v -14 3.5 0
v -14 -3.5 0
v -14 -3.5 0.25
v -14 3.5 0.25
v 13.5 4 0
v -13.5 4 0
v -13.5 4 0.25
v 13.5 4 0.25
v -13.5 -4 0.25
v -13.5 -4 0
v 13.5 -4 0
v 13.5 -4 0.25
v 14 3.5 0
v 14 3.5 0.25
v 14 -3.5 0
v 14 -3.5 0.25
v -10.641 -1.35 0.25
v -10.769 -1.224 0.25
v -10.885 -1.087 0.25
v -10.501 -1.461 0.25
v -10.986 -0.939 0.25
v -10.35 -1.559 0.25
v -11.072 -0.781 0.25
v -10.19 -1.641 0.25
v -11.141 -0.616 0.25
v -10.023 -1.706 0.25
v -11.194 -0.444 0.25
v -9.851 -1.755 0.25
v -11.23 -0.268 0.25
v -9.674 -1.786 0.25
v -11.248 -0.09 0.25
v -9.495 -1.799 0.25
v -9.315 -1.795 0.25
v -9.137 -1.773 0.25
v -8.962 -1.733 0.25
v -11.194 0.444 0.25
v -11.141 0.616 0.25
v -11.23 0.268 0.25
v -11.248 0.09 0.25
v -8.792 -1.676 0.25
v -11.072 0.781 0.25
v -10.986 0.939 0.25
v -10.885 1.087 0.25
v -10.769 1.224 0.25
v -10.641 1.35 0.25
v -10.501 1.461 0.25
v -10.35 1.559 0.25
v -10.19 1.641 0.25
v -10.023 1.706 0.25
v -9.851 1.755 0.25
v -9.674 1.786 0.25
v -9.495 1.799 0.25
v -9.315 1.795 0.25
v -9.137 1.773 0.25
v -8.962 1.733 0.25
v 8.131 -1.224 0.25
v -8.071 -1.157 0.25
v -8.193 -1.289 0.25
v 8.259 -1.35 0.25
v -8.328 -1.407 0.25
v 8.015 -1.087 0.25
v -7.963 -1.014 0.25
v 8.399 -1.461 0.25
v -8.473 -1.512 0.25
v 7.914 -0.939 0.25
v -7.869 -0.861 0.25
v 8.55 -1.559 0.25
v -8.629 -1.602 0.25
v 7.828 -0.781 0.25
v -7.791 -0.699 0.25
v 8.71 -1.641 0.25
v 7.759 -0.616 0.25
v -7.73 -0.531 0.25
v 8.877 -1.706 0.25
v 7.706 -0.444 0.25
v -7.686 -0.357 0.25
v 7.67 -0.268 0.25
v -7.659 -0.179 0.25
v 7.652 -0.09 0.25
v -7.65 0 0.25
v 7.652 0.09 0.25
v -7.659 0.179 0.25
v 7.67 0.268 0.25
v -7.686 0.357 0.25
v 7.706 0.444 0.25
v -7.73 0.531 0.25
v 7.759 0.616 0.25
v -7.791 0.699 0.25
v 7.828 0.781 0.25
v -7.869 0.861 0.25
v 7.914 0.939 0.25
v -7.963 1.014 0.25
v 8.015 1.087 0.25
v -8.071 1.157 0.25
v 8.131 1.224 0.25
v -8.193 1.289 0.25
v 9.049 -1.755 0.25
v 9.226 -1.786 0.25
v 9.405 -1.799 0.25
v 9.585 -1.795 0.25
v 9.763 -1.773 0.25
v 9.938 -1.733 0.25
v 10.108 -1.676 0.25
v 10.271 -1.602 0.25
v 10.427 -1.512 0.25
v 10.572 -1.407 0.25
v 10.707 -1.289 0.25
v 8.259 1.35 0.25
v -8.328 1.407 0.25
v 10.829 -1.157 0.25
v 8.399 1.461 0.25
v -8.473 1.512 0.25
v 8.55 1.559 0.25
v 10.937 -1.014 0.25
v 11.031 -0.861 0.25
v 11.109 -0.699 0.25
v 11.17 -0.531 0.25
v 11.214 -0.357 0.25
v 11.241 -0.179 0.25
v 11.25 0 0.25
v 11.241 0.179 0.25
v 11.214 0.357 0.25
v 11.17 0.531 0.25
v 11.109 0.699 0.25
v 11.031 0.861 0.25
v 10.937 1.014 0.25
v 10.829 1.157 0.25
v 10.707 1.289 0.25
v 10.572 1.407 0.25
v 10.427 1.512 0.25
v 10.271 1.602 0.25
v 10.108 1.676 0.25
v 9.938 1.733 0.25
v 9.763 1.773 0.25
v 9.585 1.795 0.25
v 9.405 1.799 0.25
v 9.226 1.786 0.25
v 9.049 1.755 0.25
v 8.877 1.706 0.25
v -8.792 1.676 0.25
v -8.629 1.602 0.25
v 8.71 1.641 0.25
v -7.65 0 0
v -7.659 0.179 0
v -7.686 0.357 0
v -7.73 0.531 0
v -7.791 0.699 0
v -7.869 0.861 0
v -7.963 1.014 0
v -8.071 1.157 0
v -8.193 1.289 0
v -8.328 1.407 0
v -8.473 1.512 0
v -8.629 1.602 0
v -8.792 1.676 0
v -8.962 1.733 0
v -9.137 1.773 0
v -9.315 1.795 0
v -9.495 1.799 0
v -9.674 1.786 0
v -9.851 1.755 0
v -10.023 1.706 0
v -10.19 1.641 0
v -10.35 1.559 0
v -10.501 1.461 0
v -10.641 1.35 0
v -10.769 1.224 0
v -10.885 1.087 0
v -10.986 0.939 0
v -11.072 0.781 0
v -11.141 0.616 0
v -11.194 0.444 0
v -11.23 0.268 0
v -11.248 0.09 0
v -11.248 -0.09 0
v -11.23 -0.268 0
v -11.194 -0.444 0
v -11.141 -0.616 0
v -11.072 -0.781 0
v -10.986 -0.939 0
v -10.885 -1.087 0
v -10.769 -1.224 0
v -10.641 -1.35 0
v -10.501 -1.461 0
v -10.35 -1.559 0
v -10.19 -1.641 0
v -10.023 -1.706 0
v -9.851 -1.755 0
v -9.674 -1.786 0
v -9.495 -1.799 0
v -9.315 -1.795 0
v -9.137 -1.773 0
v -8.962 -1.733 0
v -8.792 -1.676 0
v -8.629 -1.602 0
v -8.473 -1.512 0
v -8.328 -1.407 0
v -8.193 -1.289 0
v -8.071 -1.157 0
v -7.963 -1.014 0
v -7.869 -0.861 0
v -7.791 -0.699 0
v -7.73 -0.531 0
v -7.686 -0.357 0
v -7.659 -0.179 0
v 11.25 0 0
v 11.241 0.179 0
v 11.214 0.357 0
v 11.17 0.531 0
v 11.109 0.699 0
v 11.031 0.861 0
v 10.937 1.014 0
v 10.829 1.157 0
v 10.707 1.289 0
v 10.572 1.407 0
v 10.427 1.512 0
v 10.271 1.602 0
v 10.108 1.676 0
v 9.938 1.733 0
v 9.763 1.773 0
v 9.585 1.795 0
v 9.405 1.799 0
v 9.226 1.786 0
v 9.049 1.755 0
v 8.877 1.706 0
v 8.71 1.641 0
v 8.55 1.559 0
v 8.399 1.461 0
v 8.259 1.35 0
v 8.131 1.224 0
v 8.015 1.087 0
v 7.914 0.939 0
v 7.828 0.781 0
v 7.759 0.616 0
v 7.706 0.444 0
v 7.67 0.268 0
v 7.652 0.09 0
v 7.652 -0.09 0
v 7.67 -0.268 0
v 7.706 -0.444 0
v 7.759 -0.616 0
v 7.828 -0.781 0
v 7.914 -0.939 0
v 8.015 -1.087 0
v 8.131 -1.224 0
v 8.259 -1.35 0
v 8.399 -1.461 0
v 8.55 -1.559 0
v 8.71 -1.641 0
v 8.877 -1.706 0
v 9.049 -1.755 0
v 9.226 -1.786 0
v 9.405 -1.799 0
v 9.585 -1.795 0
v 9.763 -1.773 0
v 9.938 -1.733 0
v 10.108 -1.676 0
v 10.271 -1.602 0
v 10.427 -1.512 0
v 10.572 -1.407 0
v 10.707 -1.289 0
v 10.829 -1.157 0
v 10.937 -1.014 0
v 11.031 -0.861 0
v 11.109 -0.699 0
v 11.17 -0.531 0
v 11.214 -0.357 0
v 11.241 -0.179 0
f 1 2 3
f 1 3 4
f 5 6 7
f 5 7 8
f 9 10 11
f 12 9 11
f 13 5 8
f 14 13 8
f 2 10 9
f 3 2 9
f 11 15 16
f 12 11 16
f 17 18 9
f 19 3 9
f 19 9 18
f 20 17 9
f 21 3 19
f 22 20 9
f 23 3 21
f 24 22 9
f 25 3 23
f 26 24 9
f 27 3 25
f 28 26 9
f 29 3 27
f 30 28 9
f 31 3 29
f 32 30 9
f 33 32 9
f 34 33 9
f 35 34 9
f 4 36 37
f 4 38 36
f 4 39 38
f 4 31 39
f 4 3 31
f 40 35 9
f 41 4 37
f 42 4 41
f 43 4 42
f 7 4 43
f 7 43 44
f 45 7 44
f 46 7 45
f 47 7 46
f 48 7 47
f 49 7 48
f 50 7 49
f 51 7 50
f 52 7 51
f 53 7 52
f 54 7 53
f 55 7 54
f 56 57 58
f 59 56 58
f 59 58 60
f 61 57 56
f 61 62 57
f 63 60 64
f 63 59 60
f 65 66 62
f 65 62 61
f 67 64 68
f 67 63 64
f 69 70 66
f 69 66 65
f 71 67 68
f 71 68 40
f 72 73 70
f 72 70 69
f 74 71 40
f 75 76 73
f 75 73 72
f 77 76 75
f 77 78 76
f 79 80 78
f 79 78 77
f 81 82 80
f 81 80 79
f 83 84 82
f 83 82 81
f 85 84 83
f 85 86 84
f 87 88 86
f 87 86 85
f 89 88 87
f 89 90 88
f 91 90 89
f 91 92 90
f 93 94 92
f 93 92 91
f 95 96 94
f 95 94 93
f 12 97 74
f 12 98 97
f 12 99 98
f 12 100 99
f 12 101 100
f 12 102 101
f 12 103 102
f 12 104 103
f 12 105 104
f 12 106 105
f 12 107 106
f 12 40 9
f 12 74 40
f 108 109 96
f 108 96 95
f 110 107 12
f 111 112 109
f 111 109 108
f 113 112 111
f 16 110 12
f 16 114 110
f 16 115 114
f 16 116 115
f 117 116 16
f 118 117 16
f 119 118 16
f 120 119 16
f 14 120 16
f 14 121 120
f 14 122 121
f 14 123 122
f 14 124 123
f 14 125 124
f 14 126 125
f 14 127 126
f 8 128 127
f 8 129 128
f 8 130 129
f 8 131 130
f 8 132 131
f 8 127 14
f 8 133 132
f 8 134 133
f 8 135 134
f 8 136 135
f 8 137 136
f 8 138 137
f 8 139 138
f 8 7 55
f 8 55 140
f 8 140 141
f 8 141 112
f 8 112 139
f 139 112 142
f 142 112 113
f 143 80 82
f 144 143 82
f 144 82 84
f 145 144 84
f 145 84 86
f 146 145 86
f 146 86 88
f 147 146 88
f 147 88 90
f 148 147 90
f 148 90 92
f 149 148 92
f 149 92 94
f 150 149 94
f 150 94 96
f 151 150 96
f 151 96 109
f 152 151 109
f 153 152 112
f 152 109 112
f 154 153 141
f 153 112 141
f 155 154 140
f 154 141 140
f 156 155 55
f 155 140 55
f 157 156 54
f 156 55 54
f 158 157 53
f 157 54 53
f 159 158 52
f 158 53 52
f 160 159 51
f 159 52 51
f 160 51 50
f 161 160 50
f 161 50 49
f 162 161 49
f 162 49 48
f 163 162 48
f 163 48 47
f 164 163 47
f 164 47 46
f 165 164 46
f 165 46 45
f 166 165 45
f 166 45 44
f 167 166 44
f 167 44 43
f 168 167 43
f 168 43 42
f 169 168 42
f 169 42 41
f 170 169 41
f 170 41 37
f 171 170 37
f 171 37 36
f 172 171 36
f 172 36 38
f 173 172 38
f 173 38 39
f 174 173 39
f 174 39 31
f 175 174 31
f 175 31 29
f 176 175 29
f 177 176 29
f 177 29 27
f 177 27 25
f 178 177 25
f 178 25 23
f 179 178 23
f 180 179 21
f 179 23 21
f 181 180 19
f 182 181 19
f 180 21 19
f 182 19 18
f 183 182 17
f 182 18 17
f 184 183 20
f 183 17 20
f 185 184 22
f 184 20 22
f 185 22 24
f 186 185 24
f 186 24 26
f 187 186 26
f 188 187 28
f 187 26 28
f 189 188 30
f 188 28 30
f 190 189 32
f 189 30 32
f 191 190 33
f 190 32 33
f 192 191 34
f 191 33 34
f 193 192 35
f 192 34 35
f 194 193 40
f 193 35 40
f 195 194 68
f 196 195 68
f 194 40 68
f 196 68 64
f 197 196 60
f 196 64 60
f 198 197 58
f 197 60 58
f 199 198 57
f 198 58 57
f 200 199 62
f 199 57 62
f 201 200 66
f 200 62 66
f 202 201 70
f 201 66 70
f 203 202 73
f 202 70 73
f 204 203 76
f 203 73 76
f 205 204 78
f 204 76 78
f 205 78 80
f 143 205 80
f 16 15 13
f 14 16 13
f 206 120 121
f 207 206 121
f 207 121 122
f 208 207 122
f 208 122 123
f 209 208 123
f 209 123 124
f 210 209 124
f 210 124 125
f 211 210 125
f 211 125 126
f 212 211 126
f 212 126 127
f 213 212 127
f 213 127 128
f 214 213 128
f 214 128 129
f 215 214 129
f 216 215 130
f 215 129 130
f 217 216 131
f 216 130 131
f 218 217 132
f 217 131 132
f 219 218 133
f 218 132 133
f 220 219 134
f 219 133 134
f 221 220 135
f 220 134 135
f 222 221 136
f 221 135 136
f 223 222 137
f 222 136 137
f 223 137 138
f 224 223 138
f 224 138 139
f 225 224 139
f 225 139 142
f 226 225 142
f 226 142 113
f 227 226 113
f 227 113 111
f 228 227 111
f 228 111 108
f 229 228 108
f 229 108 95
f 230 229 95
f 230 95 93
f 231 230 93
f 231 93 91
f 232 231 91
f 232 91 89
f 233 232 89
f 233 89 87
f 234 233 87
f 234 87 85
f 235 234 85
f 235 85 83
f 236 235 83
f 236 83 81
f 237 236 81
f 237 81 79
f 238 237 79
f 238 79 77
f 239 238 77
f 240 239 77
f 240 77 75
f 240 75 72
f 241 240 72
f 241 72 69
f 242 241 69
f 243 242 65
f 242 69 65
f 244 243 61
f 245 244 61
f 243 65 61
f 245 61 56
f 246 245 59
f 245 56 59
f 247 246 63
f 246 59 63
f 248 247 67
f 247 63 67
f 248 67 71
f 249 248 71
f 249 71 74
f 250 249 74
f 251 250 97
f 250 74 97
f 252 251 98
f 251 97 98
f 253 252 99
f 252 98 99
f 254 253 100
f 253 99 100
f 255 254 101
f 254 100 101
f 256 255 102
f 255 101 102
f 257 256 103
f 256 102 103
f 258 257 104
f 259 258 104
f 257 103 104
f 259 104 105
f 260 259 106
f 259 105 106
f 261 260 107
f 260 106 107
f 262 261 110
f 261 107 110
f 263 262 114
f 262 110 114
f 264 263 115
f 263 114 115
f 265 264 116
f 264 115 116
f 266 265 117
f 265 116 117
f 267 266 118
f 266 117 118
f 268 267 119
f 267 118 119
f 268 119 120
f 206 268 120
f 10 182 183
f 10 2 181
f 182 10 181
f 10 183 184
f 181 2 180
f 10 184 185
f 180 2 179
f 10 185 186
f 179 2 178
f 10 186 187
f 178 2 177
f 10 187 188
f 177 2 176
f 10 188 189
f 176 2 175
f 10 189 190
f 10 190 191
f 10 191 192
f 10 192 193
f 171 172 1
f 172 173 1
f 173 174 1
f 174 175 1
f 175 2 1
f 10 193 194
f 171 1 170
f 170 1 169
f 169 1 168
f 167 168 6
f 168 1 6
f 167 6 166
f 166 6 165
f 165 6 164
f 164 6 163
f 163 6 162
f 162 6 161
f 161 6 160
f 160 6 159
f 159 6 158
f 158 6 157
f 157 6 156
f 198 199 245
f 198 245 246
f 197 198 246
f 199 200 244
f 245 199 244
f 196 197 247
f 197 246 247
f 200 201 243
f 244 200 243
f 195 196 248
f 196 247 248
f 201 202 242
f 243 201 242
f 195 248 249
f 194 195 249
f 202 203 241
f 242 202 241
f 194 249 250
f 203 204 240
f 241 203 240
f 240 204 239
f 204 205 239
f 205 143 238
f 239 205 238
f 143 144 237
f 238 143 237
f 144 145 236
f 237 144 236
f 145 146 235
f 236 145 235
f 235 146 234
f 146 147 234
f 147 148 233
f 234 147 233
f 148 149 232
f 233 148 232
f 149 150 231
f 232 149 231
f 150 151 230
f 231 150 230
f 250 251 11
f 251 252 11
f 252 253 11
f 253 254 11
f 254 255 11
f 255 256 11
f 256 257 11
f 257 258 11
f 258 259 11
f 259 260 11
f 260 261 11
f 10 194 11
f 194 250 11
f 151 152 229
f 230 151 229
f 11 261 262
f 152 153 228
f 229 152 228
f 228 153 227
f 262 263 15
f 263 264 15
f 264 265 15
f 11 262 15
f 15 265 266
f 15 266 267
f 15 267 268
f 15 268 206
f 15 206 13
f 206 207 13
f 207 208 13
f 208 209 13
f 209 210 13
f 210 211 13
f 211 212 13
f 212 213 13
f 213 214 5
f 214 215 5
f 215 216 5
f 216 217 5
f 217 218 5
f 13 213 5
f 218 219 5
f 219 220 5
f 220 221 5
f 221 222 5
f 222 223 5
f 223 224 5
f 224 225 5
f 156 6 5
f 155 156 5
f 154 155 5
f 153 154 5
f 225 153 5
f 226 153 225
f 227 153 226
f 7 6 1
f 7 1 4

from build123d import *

# Parameters (mm, degrees)
F0_W     = 28
F0_H     = 8
F1_DEPTH = 0.25
F2_SIZE  = 0.5
F3_R     = 1.8
F4_DEPTH = 0.251


with BuildPart() as f1:
    # F0 (on Top) → F1 (new body)
    with BuildSketch(Plane.XY):
        Rectangle(F0_W, F0_H)
    extrude(amount=F1_DEPTH)

    # F2
    f2_edges = [f1.edges().sort_by_distance(p)[0] for p in [
        (-14, -4, 0.125),
        (-14, 4, 0.125),
        (14, -4, 0.125),
        (14, 4, 0.125),
    ]]
    chamfer(f2_edges, length=F2_SIZE)

    # F3 (on face) → F4 (cut, through all)
    with BuildSketch(Plane.XY.offset(0.25)):
        with Locations((-9.45, 0)):
            Circle(F3_R)
        with Locations((9.45, 0)):
            Circle(F3_R)
    extrude(amount=-F4_DEPTH, mode=Mode.SUBTRACT)


solid = f1.part
